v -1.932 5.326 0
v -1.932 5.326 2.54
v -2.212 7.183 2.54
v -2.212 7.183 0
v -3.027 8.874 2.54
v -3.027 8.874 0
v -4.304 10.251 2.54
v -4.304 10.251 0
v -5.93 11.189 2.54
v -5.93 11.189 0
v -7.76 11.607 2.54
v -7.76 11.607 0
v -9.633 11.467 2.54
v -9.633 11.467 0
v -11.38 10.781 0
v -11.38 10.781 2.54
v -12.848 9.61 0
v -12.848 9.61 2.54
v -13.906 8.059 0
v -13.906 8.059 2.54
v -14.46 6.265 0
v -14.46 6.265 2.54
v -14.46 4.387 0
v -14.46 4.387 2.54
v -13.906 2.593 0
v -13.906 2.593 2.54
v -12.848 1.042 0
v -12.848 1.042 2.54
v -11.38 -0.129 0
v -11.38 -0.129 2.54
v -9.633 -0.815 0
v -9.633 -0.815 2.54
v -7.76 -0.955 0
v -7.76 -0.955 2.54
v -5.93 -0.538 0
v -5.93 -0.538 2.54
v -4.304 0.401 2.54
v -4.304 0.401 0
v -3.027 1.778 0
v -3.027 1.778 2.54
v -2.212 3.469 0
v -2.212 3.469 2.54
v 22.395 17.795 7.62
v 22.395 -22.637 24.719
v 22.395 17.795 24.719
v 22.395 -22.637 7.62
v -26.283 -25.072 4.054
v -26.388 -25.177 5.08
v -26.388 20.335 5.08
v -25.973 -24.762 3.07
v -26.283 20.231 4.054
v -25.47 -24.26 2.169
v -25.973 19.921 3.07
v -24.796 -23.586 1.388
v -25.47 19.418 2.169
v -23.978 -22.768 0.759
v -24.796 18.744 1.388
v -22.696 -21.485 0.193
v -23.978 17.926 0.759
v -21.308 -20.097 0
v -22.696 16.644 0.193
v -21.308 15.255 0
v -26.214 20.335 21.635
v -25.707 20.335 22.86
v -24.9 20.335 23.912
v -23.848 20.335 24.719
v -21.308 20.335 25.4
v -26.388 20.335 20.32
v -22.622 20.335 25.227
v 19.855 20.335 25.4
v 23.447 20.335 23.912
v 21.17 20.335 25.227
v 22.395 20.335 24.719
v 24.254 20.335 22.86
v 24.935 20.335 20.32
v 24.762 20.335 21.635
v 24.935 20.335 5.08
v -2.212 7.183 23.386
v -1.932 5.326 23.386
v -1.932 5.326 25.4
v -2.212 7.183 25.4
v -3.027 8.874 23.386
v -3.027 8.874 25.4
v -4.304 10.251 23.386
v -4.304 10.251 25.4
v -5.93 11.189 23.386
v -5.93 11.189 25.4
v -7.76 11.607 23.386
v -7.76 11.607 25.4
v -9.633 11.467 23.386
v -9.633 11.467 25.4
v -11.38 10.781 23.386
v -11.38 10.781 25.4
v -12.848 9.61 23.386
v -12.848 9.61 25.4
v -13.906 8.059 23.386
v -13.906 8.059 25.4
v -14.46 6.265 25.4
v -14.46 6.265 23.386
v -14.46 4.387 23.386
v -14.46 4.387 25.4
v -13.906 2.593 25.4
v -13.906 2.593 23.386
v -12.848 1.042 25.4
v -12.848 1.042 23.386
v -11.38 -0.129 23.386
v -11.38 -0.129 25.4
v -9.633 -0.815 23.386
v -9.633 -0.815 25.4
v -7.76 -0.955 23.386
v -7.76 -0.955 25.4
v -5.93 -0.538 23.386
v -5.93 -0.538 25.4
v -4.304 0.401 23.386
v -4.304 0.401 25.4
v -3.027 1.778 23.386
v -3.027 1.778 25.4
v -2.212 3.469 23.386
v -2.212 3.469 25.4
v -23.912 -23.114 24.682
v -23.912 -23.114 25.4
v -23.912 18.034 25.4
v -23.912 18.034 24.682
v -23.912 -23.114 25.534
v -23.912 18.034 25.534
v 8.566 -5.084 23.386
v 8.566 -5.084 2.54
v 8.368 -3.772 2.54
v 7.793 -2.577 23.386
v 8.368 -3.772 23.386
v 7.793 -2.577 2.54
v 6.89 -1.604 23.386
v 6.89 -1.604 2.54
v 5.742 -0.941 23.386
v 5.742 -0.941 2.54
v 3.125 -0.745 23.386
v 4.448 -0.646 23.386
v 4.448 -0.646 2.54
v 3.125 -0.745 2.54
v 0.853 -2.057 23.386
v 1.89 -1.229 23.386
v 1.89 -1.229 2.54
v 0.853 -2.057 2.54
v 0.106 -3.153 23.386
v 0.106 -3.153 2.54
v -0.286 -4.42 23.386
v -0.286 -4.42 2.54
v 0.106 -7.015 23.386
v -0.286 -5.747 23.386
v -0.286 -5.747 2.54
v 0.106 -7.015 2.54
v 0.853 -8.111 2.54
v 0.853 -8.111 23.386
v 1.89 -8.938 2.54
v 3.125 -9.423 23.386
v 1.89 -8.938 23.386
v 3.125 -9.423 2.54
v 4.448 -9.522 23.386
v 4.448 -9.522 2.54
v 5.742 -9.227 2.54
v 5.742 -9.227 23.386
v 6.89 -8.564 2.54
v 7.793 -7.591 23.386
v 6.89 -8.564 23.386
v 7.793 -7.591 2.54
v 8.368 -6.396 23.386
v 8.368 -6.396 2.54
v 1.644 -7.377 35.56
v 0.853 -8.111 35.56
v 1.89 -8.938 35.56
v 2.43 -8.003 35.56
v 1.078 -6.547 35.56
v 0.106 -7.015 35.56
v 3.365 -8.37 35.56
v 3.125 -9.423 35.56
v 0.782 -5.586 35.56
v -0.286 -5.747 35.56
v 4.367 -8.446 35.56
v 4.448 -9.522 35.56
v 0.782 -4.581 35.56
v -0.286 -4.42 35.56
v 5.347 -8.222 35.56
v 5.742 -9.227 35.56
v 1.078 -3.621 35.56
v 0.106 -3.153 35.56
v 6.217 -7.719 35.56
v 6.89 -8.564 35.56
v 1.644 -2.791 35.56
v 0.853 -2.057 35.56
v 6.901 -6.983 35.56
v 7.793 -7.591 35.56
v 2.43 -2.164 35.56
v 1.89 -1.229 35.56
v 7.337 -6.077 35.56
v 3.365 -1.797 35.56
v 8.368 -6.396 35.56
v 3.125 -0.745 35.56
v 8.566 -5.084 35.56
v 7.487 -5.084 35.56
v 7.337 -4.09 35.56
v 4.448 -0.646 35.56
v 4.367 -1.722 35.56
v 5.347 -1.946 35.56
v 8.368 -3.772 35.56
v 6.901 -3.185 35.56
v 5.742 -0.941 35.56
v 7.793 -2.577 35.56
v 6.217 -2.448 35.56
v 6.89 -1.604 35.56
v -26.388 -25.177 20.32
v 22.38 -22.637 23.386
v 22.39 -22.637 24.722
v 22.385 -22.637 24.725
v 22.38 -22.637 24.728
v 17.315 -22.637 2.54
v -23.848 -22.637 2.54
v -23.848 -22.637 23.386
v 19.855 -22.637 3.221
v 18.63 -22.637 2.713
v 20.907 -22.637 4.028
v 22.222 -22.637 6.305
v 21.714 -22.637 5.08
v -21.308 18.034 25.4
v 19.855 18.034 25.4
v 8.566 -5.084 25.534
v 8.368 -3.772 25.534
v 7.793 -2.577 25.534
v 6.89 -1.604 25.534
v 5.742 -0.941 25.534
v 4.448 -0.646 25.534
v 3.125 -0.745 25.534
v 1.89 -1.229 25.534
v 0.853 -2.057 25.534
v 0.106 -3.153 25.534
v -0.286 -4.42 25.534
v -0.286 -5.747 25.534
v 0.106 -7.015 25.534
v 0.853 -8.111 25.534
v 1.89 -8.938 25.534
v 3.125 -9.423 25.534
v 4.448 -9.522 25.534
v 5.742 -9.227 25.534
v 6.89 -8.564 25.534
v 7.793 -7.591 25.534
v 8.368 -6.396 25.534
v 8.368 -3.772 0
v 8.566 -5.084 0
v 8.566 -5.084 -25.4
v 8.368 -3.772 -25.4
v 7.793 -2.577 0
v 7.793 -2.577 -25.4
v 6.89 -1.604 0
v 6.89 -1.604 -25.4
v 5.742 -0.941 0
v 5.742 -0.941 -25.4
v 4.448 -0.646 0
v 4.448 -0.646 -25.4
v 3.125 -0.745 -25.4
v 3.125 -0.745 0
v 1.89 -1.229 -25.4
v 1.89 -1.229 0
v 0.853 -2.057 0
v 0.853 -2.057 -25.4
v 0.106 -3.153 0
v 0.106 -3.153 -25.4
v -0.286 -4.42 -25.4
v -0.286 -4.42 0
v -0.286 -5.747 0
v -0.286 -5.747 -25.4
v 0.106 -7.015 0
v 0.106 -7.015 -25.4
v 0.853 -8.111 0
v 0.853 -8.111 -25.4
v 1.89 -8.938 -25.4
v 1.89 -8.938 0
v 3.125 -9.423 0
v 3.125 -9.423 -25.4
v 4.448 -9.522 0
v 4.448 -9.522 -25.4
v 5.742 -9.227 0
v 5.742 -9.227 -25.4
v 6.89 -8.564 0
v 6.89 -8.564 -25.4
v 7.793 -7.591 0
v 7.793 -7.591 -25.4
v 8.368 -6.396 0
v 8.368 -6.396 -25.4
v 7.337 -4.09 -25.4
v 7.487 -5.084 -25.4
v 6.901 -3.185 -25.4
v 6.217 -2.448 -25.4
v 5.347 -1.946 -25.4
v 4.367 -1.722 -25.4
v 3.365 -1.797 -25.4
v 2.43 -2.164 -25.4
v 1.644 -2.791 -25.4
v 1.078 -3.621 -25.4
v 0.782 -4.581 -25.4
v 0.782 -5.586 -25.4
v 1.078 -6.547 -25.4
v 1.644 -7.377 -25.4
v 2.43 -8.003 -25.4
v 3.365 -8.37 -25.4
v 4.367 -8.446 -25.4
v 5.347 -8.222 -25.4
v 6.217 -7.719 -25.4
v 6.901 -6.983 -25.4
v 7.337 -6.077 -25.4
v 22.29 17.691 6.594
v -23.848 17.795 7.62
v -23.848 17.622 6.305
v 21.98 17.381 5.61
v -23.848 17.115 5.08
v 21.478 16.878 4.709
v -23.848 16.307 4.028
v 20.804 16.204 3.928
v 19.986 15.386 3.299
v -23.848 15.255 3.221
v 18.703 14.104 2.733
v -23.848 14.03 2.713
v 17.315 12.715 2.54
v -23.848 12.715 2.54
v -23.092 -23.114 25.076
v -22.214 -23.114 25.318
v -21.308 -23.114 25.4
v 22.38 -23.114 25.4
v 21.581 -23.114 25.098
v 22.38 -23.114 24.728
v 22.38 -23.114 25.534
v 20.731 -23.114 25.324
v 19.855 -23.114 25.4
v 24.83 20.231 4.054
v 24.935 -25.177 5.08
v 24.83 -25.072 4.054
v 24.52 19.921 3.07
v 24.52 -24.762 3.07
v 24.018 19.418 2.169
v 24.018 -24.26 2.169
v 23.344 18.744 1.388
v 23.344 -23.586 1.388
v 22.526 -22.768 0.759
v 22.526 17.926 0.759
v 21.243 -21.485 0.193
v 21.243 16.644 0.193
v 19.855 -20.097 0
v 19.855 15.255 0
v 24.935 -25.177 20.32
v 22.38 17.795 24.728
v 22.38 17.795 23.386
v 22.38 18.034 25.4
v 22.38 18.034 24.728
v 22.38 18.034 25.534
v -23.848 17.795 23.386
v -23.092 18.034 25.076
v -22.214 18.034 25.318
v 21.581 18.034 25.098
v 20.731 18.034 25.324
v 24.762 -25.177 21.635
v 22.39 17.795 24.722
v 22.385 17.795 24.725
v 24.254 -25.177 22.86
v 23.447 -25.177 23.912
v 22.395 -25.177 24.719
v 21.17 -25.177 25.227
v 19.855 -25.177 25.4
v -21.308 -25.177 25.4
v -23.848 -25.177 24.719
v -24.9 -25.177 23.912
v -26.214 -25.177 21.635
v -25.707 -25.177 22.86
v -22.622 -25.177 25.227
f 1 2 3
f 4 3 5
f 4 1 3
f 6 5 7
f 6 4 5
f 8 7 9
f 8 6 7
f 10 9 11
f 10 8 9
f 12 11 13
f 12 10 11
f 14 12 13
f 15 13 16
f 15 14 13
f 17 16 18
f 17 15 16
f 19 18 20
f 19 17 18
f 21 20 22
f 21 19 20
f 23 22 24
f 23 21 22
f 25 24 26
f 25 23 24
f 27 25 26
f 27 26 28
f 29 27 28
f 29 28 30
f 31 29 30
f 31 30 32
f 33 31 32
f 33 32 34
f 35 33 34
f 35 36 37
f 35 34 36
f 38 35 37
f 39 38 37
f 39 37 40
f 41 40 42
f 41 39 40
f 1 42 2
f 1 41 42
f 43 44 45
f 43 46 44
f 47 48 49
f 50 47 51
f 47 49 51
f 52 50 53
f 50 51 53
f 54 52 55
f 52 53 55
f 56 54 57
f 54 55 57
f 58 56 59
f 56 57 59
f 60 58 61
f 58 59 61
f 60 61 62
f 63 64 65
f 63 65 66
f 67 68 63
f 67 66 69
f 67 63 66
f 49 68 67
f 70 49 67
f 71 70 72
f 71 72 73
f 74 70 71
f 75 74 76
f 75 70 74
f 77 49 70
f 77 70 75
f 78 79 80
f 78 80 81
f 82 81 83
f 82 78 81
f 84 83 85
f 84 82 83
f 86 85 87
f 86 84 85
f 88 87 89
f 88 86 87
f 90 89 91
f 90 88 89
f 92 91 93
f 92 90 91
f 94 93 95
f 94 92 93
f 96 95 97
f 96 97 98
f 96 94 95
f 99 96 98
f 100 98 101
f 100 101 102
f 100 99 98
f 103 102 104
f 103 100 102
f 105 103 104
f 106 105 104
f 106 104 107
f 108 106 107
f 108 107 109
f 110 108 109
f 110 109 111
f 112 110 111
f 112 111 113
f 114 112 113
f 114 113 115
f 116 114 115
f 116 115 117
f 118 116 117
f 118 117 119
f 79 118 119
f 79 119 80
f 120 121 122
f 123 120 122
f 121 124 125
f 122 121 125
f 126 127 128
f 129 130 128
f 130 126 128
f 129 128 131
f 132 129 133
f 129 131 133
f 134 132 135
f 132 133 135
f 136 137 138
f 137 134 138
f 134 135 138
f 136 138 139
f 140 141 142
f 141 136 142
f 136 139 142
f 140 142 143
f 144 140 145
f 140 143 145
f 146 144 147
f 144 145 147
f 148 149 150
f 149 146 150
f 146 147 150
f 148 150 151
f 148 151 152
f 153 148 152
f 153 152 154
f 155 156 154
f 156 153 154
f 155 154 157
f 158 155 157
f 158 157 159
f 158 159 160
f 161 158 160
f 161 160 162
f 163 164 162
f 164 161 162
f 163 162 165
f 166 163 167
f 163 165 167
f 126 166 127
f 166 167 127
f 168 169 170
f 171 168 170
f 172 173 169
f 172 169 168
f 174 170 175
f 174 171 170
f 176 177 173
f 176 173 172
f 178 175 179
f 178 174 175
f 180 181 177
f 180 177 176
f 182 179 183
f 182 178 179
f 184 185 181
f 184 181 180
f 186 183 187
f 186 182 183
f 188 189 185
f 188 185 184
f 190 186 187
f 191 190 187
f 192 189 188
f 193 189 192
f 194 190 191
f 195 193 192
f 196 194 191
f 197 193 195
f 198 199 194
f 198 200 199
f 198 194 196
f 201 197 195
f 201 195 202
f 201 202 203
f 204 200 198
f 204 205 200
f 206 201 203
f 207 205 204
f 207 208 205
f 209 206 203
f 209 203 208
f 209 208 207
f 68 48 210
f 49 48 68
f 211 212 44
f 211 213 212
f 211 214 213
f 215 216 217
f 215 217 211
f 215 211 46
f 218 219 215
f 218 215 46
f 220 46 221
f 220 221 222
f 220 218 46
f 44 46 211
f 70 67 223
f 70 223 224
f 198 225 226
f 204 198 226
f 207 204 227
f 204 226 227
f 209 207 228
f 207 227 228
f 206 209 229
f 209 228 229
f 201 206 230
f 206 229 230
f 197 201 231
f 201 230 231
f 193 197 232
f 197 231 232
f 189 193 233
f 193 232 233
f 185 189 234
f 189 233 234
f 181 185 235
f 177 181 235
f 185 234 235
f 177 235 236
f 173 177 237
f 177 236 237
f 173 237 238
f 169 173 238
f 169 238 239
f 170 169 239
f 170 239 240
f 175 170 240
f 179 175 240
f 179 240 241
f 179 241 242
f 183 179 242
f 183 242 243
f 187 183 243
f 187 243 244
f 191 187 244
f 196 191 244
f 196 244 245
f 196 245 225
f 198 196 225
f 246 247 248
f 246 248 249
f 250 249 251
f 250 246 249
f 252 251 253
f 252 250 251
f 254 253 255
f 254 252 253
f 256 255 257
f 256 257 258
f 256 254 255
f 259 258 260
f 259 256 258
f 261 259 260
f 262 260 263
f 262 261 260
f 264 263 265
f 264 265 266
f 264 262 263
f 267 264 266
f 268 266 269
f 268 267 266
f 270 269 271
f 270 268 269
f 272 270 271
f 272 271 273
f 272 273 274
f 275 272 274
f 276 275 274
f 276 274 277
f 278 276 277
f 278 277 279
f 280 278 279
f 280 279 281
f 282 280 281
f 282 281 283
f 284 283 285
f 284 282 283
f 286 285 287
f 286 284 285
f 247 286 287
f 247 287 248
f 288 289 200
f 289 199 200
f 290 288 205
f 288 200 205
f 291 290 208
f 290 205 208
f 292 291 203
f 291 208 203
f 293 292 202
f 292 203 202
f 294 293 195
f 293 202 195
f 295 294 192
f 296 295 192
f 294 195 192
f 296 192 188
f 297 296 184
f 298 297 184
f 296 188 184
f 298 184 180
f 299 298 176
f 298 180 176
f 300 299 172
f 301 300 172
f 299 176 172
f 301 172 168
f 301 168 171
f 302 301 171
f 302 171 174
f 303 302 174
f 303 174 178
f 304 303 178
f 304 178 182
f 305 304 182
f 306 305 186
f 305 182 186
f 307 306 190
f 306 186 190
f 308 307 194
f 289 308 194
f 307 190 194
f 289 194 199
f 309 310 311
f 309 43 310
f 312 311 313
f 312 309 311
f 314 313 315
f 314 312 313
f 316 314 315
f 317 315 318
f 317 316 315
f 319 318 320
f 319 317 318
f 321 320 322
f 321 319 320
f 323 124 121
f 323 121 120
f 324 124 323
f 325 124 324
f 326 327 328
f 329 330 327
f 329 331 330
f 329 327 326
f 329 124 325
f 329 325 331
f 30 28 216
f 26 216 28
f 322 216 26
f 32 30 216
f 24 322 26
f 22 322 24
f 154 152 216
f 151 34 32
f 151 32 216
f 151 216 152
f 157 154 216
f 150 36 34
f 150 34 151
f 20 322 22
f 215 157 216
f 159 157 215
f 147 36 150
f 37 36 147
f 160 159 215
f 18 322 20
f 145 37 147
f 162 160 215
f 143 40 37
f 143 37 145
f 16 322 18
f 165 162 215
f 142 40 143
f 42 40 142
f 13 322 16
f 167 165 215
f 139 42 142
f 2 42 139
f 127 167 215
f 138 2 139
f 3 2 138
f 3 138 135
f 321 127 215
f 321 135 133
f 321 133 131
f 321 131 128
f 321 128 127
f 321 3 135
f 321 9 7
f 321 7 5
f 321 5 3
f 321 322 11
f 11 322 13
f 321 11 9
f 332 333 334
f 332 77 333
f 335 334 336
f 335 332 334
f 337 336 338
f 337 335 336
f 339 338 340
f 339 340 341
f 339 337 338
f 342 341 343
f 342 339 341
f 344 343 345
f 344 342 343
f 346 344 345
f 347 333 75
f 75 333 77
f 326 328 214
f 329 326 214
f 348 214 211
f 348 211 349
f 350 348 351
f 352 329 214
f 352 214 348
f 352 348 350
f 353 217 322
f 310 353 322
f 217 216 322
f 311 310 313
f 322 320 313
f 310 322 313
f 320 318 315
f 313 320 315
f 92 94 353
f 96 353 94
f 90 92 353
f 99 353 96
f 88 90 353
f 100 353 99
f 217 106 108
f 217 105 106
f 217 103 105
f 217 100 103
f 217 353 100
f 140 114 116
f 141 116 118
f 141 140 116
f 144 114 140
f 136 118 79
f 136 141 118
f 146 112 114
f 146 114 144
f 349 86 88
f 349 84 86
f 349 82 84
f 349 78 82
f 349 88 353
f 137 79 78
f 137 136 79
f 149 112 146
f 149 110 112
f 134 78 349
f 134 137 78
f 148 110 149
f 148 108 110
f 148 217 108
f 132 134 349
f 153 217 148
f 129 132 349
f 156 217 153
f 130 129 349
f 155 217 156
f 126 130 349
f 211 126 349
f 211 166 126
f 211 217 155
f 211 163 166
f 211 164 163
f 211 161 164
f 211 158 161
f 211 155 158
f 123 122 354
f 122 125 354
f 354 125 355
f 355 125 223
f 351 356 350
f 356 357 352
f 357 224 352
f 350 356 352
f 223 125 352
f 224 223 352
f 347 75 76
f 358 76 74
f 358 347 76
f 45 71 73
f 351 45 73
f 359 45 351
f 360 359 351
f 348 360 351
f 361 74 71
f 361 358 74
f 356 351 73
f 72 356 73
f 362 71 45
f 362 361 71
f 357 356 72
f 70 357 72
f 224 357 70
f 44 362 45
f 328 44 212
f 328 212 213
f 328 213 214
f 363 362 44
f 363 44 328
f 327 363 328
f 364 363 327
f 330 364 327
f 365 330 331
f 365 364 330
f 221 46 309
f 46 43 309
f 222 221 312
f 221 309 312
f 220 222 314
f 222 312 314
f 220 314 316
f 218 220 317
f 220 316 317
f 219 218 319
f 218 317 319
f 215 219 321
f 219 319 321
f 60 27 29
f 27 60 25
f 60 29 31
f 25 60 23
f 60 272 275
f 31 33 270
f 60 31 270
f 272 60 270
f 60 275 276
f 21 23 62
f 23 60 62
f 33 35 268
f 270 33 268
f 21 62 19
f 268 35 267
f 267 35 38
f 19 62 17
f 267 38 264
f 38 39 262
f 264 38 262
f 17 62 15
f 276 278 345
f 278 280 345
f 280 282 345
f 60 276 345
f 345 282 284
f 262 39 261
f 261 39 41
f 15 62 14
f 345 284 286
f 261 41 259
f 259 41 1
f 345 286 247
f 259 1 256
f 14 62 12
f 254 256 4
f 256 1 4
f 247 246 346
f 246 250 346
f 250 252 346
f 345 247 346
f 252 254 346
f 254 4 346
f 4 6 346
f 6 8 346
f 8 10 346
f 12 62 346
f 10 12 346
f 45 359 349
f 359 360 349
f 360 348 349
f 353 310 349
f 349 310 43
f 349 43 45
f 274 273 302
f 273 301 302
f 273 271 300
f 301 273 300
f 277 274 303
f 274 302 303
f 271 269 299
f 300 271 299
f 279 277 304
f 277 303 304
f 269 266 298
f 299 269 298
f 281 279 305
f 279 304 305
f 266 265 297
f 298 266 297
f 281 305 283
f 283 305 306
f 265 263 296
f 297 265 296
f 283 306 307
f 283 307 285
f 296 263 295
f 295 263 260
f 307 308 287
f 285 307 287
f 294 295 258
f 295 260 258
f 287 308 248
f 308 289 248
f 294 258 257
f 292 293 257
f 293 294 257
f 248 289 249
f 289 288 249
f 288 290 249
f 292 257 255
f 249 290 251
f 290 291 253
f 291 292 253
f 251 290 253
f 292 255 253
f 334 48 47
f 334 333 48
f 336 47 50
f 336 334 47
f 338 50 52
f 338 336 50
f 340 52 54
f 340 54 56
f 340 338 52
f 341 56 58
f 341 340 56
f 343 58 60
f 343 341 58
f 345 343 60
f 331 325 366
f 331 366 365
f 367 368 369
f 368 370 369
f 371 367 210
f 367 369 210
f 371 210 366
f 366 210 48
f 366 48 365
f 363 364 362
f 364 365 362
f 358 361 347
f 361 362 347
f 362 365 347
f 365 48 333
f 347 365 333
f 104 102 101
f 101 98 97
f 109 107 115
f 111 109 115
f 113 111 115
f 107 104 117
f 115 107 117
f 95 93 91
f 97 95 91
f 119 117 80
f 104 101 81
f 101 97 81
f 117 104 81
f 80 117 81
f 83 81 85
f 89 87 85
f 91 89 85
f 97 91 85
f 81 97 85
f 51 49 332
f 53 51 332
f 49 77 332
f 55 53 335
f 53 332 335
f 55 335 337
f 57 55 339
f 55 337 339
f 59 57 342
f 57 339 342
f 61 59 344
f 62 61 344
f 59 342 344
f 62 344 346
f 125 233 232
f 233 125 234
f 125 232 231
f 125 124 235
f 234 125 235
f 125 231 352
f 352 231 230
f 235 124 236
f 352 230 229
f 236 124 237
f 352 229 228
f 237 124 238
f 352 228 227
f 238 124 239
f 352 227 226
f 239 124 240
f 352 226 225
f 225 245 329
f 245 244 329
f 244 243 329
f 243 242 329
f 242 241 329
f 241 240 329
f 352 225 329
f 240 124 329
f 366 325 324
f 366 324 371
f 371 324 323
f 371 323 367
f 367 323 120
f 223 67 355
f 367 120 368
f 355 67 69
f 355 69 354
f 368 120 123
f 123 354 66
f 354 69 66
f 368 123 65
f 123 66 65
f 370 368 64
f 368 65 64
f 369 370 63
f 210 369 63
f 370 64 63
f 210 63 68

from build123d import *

# Parameters (mm, degrees)
F0_W           = 51.3226017356
F0_H           = 45.5124992877
F1_DEPTH       = 25.4
F2_T           = -2.54
F3_R           = 5.08
F4_W           = 46.2916959077
F4_H           = 2.1475534886
F5_DEPTH       = 23.114
F5_DEPTH_BACK  = 18.034
F6_R           = 6.2989363063
F7_DEPTH       = 25.4
F7_DEPTH_BACK  = 36.83
F8_R           = 4.4507292133
F9_DEPTH       = 35.56
F9_DEPTH_BACK  = 25.4
F10_R          = 3.3711078554
F11_DEPTH      = 27.686
F11_DEPTH_BACK = 52.2224
F12_T4_DEPTH   = 70.9124992877
F12_T10_DEPTH  = 70.9124992877
F12_T16_DEPTH  = 70.9124992877
F12_T23_DEPTH  = 70.9124992877
F12_T29_DEPTH  = 70.9124992877
F12_T35_DEPTH  = 70.9124992877
F12_T41_DEPTH  = 70.9124992877
F12_T47_DEPTH  = 70.9124992877
F12_T54_DEPTH  = 70.9124992877
F12_T60_DEPTH  = 70.9124992877


# Not quite as in the source:
# - a fillet or chamfer that OpenCascade refuses, or shapes differently, is made with other operations: its cross-section is extruded or revolved along the edge and cut away or added


with BuildPart() as f1:
    # F0 (on Top) → F1 (new body)
    with BuildSketch(Plane.XY):
        with Locations((-0.7262639701, -2.4208771065)):
            Rectangle(F0_W, F0_H)
    extrude(amount=F1_DEPTH)

    # F2
    f2_openings = [f1.faces().sort_by_distance(p)[0] for p in [
        (-0.726264, -2.420877, 25.4),
    ]]
    offset(amount=F2_T, openings=f2_openings)

    # F3
    f3_edges = [f1.edges().sort_by_distance(p)[0] for p in [
        (-0.726264, -25.177127, 0),
        (-26.387565, -2.420877, 0),
        (-0.726264, 17.795373, 2.54),
        (22.395037, -2.420877, 2.54),
        (-0.726264, 20.335373, 0),
        (24.935037, -2.420877, 0),
    ]]
    fillet(f3_edges, radius=F3_R)

    # F4 (on Front) → F5 (join, two sides)
    with BuildSketch(Plane.XZ) as f5_sk:
        with Locations((-0.7661757991, 24.4599720463)):
            Rectangle(F4_W, F4_H)
    extrude(amount=F5_DEPTH)
    extrude(f5_sk.sketch, amount=-F5_DEPTH_BACK)

    # F6 (on Top) → F7 (cut, two sides)
    with BuildSketch(Plane.XY) as f7_sk:
        with Locations((-8.230984211, 5.3259306587)):
            Circle(F6_R)
    extrude(amount=F7_DEPTH, mode=Mode.SUBTRACT)
    extrude(f7_sk.sketch, amount=-F7_DEPTH_BACK, mode=Mode.SUBTRACT)

    # F8 (on Top) → F9 (join, two sides)
    with BuildSketch(Plane.XY) as f9_sk:
        with Locations((4.1154921055, -5.0838431343)):
            Circle(F8_R)
    extrude(amount=F9_DEPTH)
    extrude(f9_sk.sketch, amount=-F9_DEPTH_BACK)

    # F10 (on Top) → F11 (cut, two sides)
    with BuildSketch(Plane.XY) as f11_sk:
        with Locations((4.1154921055, -5.0838431343)):
            Circle(F10_R)
    extrude(amount=-F11_DEPTH, mode=Mode.SUBTRACT)
    extrude(f11_sk.sketch, amount=F11_DEPTH_BACK, mode=Mode.SUBTRACT)

    # F12: fillet of radius 5.08 on 2 edges, made by hand


with BuildPart() as f12_tool2:
    # F12_s3 → F12_t4 (new body)
    with BuildSketch(Plane.XZ.offset(37.8771267503)):
        with BuildLine():
            ThreePointArc((24.9350368977, 20.32), (23.4471393461, 23.9121024484), (19.8550368977, 25.4))
            Line((19.8550368977, 25.4), (24.9350368977, 25.4))
            Line((24.9350368977, 25.4), (24.9350368977, 20.32))
        make_face()
    extrude(amount=-F12_T4_DEPTH)

    split(bisect_by=Plane.YZ.offset(22.3796721548), keep=Keep.TOP)

    split(bisect_by=Plane.XZ.offset(23.114), keep=Keep.TOP)


with BuildPart() as f1_1:
    add(f1.part)

    # F12_t1: cut F12_tool2
    add(f12_tool2.part, mode=Mode.SUBTRACT)


with BuildPart() as f12_tool8:
    # F12_s9 → F12_t10 (new body)
    with BuildSketch(Plane.XZ.offset(37.8771267503)):
        with BuildLine():
            ThreePointArc((24.9350368977, 20.32), (23.4471393461, 23.9121024484), (19.8550368977, 25.4))
            Line((19.8550368977, 25.4), (24.9350368977, 25.4))
            Line((24.9350368977, 25.4), (24.9350368977, 20.32))
        make_face()
    extrude(amount=-F12_T10_DEPTH)

    split(bisect_by=Plane.YZ.offset(22.3796721548), keep=Keep.BOTTOM)

    split(bisect_by=Plane.XZ.offset(23.114), keep=Keep.TOP)


with BuildPart() as f1_2:
    add(f1_1.part)

    # F12_t7: cut F12_tool8
    add(f12_tool8.part, mode=Mode.SUBTRACT)


with BuildPart() as f12_tool14:
    # F12_s15 → F12_t16 (new body)
    with BuildSketch(Plane.XZ.offset(37.8771267503)):
        with BuildLine():
            ThreePointArc((24.9350368977, 20.32), (23.4471393461, 23.9121024484), (19.8550368977, 25.4))
            Line((19.8550368977, 25.4), (24.9350368977, 25.4))
            Line((24.9350368977, 25.4), (24.9350368977, 20.32))
        make_face()
    extrude(amount=-F12_T16_DEPTH)

    split(bisect_by=Plane.YZ.offset(22.3796721548), keep=Keep.TOP)

    split(bisect_by=Plane.XZ.offset(-18.034), keep=Keep.TOP)

    split(bisect_by=Plane.XZ.offset(23.114), keep=Keep.BOTTOM)


with BuildPart() as f1_3:
    add(f1_2.part)

    # F12_t13: cut F12_tool14
    add(f12_tool14.part, mode=Mode.SUBTRACT)


with BuildPart() as f12_tool21:
    # F12_s22 → F12_t23 (new body)
    with BuildSketch(Plane.XZ.offset(37.8771267503)):
        with BuildLine():
            ThreePointArc((24.9350368977, 20.32), (23.4471393461, 23.9121024484), (19.8550368977, 25.4))
            Line((19.8550368977, 25.4), (24.9350368977, 25.4))
            Line((24.9350368977, 25.4), (24.9350368977, 20.32))
        make_face()
    extrude(amount=-F12_T23_DEPTH)

    split(bisect_by=Plane.YZ.offset(22.3796721548), keep=Keep.TOP)

    split(bisect_by=Plane.XZ.offset(-18.034), keep=Keep.BOTTOM)


with BuildPart() as f1_4:
    add(f1_3.part)

    # F12_t20: cut F12_tool21
    add(f12_tool21.part, mode=Mode.SUBTRACT)


with BuildPart() as f12_tool27:
    # F12_s28 → F12_t29 (new body)
    with BuildSketch(Plane.XZ.offset(37.8771267503)):
        with BuildLine():
            ThreePointArc((24.9350368977, 20.32), (23.4471393461, 23.9121024484), (19.8550368977, 25.4))
            Line((19.8550368977, 25.4), (24.9350368977, 25.4))
            Line((24.9350368977, 25.4), (24.9350368977, 20.32))
        make_face()
    extrude(amount=-F12_T29_DEPTH)

    split(bisect_by=Plane.YZ.offset(22.3796721548), keep=Keep.BOTTOM)

    split(bisect_by=Plane.XZ.offset(-18.034), keep=Keep.BOTTOM)


with BuildPart() as f1_5:
    add(f1_4.part)

    # F12_t26: cut F12_tool27
    add(f12_tool27.part, mode=Mode.SUBTRACT)


with BuildPart() as f12_tool33:
    # F12_s34 → F12_t35 (new body)
    with BuildSketch(Plane.XZ.offset(-33.0353725374)):
        with BuildLine():
            ThreePointArc((-21.3075648379, 25.4), (-24.8996672864, 23.9121024484), (-26.3875648379, 20.32))
            Line((-26.3875648379, 20.32), (-26.3875648379, 25.4))
            Line((-26.3875648379, 25.4), (-21.3075648379, 25.4))
        make_face()
    extrude(amount=F12_T35_DEPTH)

    split(bisect_by=Plane.XZ.offset(-18.034), keep=Keep.BOTTOM)

    split(bisect_by=Plane.YZ.offset(-23.9120237529), keep=Keep.TOP)


with BuildPart() as f1_6:
    add(f1_5.part)

    # F12_t32: cut F12_tool33
    add(f12_tool33.part, mode=Mode.SUBTRACT)


with BuildPart() as f12_tool39:
    # F12_s40 → F12_t41 (new body)
    with BuildSketch(Plane.XZ.offset(-33.0353725374)):
        with BuildLine():
            ThreePointArc((-21.3075648379, 25.4), (-24.8996672864, 23.9121024484), (-26.3875648379, 20.32))
            Line((-26.3875648379, 20.32), (-26.3875648379, 25.4))
            Line((-26.3875648379, 25.4), (-21.3075648379, 25.4))
        make_face()
    extrude(amount=F12_T41_DEPTH)

    split(bisect_by=Plane.XZ.offset(-18.034), keep=Keep.BOTTOM)

    split(bisect_by=Plane.YZ.offset(-23.9120237529), keep=Keep.BOTTOM)


with BuildPart() as f1_7:
    add(f1_6.part)

    # F12_t38: cut F12_tool39
    add(f12_tool39.part, mode=Mode.SUBTRACT)


with BuildPart() as f12_tool45:
    # F12_s46 → F12_t47 (new body)
    with BuildSketch(Plane.XZ.offset(-33.0353725374)):
        with BuildLine():
            ThreePointArc((-21.3075648379, 25.4), (-24.8996672864, 23.9121024484), (-26.3875648379, 20.32))
            Line((-26.3875648379, 20.32), (-26.3875648379, 25.4))
            Line((-26.3875648379, 25.4), (-21.3075648379, 25.4))
        make_face()
    extrude(amount=F12_T47_DEPTH)

    split(bisect_by=Plane.XZ.offset(-18.034), keep=Keep.TOP)

    split(bisect_by=Plane.YZ.offset(-23.9120237529), keep=Keep.BOTTOM)

    split(bisect_by=Plane.XZ.offset(23.114), keep=Keep.BOTTOM)


with BuildPart() as f1_8:
    add(f1_7.part)

    # F12_t44: cut F12_tool45
    add(f12_tool45.part, mode=Mode.SUBTRACT)


with BuildPart() as f12_tool52:
    # F12_s53 → F12_t54 (new body)
    with BuildSketch(Plane.XZ.offset(-33.0353725374)):
        with BuildLine():
            ThreePointArc((-21.3075648379, 25.4), (-24.8996672864, 23.9121024484), (-26.3875648379, 20.32))
            Line((-26.3875648379, 20.32), (-26.3875648379, 25.4))
            Line((-26.3875648379, 25.4), (-21.3075648379, 25.4))
        make_face()
    extrude(amount=F12_T54_DEPTH)

    split(bisect_by=Plane.YZ.offset(-23.9120237529), keep=Keep.TOP)

    split(bisect_by=Plane.XZ.offset(23.114), keep=Keep.TOP)


with BuildPart() as f1_9:
    add(f1_8.part)

    # F12_t51: cut F12_tool52
    add(f12_tool52.part, mode=Mode.SUBTRACT)


with BuildPart() as f12_tool58:
    # F12_s59 → F12_t60 (new body)
    with BuildSketch(Plane.XZ.offset(-33.0353725374)):
        with BuildLine():
            ThreePointArc((-21.3075648379, 25.4), (-24.8996672864, 23.9121024484), (-26.3875648379, 20.32))
            Line((-26.3875648379, 20.32), (-26.3875648379, 25.4))
            Line((-26.3875648379, 25.4), (-21.3075648379, 25.4))
        make_face()
    extrude(amount=F12_T60_DEPTH)

    split(bisect_by=Plane.YZ.offset(-23.9120237529), keep=Keep.BOTTOM)

    split(bisect_by=Plane.XZ.offset(23.114), keep=Keep.TOP)


with BuildPart() as f1_10:
    add(f1_9.part)

    # F12_t57: cut F12_tool58
    add(f12_tool58.part, mode=Mode.SUBTRACT)


solid = f1_10.part
